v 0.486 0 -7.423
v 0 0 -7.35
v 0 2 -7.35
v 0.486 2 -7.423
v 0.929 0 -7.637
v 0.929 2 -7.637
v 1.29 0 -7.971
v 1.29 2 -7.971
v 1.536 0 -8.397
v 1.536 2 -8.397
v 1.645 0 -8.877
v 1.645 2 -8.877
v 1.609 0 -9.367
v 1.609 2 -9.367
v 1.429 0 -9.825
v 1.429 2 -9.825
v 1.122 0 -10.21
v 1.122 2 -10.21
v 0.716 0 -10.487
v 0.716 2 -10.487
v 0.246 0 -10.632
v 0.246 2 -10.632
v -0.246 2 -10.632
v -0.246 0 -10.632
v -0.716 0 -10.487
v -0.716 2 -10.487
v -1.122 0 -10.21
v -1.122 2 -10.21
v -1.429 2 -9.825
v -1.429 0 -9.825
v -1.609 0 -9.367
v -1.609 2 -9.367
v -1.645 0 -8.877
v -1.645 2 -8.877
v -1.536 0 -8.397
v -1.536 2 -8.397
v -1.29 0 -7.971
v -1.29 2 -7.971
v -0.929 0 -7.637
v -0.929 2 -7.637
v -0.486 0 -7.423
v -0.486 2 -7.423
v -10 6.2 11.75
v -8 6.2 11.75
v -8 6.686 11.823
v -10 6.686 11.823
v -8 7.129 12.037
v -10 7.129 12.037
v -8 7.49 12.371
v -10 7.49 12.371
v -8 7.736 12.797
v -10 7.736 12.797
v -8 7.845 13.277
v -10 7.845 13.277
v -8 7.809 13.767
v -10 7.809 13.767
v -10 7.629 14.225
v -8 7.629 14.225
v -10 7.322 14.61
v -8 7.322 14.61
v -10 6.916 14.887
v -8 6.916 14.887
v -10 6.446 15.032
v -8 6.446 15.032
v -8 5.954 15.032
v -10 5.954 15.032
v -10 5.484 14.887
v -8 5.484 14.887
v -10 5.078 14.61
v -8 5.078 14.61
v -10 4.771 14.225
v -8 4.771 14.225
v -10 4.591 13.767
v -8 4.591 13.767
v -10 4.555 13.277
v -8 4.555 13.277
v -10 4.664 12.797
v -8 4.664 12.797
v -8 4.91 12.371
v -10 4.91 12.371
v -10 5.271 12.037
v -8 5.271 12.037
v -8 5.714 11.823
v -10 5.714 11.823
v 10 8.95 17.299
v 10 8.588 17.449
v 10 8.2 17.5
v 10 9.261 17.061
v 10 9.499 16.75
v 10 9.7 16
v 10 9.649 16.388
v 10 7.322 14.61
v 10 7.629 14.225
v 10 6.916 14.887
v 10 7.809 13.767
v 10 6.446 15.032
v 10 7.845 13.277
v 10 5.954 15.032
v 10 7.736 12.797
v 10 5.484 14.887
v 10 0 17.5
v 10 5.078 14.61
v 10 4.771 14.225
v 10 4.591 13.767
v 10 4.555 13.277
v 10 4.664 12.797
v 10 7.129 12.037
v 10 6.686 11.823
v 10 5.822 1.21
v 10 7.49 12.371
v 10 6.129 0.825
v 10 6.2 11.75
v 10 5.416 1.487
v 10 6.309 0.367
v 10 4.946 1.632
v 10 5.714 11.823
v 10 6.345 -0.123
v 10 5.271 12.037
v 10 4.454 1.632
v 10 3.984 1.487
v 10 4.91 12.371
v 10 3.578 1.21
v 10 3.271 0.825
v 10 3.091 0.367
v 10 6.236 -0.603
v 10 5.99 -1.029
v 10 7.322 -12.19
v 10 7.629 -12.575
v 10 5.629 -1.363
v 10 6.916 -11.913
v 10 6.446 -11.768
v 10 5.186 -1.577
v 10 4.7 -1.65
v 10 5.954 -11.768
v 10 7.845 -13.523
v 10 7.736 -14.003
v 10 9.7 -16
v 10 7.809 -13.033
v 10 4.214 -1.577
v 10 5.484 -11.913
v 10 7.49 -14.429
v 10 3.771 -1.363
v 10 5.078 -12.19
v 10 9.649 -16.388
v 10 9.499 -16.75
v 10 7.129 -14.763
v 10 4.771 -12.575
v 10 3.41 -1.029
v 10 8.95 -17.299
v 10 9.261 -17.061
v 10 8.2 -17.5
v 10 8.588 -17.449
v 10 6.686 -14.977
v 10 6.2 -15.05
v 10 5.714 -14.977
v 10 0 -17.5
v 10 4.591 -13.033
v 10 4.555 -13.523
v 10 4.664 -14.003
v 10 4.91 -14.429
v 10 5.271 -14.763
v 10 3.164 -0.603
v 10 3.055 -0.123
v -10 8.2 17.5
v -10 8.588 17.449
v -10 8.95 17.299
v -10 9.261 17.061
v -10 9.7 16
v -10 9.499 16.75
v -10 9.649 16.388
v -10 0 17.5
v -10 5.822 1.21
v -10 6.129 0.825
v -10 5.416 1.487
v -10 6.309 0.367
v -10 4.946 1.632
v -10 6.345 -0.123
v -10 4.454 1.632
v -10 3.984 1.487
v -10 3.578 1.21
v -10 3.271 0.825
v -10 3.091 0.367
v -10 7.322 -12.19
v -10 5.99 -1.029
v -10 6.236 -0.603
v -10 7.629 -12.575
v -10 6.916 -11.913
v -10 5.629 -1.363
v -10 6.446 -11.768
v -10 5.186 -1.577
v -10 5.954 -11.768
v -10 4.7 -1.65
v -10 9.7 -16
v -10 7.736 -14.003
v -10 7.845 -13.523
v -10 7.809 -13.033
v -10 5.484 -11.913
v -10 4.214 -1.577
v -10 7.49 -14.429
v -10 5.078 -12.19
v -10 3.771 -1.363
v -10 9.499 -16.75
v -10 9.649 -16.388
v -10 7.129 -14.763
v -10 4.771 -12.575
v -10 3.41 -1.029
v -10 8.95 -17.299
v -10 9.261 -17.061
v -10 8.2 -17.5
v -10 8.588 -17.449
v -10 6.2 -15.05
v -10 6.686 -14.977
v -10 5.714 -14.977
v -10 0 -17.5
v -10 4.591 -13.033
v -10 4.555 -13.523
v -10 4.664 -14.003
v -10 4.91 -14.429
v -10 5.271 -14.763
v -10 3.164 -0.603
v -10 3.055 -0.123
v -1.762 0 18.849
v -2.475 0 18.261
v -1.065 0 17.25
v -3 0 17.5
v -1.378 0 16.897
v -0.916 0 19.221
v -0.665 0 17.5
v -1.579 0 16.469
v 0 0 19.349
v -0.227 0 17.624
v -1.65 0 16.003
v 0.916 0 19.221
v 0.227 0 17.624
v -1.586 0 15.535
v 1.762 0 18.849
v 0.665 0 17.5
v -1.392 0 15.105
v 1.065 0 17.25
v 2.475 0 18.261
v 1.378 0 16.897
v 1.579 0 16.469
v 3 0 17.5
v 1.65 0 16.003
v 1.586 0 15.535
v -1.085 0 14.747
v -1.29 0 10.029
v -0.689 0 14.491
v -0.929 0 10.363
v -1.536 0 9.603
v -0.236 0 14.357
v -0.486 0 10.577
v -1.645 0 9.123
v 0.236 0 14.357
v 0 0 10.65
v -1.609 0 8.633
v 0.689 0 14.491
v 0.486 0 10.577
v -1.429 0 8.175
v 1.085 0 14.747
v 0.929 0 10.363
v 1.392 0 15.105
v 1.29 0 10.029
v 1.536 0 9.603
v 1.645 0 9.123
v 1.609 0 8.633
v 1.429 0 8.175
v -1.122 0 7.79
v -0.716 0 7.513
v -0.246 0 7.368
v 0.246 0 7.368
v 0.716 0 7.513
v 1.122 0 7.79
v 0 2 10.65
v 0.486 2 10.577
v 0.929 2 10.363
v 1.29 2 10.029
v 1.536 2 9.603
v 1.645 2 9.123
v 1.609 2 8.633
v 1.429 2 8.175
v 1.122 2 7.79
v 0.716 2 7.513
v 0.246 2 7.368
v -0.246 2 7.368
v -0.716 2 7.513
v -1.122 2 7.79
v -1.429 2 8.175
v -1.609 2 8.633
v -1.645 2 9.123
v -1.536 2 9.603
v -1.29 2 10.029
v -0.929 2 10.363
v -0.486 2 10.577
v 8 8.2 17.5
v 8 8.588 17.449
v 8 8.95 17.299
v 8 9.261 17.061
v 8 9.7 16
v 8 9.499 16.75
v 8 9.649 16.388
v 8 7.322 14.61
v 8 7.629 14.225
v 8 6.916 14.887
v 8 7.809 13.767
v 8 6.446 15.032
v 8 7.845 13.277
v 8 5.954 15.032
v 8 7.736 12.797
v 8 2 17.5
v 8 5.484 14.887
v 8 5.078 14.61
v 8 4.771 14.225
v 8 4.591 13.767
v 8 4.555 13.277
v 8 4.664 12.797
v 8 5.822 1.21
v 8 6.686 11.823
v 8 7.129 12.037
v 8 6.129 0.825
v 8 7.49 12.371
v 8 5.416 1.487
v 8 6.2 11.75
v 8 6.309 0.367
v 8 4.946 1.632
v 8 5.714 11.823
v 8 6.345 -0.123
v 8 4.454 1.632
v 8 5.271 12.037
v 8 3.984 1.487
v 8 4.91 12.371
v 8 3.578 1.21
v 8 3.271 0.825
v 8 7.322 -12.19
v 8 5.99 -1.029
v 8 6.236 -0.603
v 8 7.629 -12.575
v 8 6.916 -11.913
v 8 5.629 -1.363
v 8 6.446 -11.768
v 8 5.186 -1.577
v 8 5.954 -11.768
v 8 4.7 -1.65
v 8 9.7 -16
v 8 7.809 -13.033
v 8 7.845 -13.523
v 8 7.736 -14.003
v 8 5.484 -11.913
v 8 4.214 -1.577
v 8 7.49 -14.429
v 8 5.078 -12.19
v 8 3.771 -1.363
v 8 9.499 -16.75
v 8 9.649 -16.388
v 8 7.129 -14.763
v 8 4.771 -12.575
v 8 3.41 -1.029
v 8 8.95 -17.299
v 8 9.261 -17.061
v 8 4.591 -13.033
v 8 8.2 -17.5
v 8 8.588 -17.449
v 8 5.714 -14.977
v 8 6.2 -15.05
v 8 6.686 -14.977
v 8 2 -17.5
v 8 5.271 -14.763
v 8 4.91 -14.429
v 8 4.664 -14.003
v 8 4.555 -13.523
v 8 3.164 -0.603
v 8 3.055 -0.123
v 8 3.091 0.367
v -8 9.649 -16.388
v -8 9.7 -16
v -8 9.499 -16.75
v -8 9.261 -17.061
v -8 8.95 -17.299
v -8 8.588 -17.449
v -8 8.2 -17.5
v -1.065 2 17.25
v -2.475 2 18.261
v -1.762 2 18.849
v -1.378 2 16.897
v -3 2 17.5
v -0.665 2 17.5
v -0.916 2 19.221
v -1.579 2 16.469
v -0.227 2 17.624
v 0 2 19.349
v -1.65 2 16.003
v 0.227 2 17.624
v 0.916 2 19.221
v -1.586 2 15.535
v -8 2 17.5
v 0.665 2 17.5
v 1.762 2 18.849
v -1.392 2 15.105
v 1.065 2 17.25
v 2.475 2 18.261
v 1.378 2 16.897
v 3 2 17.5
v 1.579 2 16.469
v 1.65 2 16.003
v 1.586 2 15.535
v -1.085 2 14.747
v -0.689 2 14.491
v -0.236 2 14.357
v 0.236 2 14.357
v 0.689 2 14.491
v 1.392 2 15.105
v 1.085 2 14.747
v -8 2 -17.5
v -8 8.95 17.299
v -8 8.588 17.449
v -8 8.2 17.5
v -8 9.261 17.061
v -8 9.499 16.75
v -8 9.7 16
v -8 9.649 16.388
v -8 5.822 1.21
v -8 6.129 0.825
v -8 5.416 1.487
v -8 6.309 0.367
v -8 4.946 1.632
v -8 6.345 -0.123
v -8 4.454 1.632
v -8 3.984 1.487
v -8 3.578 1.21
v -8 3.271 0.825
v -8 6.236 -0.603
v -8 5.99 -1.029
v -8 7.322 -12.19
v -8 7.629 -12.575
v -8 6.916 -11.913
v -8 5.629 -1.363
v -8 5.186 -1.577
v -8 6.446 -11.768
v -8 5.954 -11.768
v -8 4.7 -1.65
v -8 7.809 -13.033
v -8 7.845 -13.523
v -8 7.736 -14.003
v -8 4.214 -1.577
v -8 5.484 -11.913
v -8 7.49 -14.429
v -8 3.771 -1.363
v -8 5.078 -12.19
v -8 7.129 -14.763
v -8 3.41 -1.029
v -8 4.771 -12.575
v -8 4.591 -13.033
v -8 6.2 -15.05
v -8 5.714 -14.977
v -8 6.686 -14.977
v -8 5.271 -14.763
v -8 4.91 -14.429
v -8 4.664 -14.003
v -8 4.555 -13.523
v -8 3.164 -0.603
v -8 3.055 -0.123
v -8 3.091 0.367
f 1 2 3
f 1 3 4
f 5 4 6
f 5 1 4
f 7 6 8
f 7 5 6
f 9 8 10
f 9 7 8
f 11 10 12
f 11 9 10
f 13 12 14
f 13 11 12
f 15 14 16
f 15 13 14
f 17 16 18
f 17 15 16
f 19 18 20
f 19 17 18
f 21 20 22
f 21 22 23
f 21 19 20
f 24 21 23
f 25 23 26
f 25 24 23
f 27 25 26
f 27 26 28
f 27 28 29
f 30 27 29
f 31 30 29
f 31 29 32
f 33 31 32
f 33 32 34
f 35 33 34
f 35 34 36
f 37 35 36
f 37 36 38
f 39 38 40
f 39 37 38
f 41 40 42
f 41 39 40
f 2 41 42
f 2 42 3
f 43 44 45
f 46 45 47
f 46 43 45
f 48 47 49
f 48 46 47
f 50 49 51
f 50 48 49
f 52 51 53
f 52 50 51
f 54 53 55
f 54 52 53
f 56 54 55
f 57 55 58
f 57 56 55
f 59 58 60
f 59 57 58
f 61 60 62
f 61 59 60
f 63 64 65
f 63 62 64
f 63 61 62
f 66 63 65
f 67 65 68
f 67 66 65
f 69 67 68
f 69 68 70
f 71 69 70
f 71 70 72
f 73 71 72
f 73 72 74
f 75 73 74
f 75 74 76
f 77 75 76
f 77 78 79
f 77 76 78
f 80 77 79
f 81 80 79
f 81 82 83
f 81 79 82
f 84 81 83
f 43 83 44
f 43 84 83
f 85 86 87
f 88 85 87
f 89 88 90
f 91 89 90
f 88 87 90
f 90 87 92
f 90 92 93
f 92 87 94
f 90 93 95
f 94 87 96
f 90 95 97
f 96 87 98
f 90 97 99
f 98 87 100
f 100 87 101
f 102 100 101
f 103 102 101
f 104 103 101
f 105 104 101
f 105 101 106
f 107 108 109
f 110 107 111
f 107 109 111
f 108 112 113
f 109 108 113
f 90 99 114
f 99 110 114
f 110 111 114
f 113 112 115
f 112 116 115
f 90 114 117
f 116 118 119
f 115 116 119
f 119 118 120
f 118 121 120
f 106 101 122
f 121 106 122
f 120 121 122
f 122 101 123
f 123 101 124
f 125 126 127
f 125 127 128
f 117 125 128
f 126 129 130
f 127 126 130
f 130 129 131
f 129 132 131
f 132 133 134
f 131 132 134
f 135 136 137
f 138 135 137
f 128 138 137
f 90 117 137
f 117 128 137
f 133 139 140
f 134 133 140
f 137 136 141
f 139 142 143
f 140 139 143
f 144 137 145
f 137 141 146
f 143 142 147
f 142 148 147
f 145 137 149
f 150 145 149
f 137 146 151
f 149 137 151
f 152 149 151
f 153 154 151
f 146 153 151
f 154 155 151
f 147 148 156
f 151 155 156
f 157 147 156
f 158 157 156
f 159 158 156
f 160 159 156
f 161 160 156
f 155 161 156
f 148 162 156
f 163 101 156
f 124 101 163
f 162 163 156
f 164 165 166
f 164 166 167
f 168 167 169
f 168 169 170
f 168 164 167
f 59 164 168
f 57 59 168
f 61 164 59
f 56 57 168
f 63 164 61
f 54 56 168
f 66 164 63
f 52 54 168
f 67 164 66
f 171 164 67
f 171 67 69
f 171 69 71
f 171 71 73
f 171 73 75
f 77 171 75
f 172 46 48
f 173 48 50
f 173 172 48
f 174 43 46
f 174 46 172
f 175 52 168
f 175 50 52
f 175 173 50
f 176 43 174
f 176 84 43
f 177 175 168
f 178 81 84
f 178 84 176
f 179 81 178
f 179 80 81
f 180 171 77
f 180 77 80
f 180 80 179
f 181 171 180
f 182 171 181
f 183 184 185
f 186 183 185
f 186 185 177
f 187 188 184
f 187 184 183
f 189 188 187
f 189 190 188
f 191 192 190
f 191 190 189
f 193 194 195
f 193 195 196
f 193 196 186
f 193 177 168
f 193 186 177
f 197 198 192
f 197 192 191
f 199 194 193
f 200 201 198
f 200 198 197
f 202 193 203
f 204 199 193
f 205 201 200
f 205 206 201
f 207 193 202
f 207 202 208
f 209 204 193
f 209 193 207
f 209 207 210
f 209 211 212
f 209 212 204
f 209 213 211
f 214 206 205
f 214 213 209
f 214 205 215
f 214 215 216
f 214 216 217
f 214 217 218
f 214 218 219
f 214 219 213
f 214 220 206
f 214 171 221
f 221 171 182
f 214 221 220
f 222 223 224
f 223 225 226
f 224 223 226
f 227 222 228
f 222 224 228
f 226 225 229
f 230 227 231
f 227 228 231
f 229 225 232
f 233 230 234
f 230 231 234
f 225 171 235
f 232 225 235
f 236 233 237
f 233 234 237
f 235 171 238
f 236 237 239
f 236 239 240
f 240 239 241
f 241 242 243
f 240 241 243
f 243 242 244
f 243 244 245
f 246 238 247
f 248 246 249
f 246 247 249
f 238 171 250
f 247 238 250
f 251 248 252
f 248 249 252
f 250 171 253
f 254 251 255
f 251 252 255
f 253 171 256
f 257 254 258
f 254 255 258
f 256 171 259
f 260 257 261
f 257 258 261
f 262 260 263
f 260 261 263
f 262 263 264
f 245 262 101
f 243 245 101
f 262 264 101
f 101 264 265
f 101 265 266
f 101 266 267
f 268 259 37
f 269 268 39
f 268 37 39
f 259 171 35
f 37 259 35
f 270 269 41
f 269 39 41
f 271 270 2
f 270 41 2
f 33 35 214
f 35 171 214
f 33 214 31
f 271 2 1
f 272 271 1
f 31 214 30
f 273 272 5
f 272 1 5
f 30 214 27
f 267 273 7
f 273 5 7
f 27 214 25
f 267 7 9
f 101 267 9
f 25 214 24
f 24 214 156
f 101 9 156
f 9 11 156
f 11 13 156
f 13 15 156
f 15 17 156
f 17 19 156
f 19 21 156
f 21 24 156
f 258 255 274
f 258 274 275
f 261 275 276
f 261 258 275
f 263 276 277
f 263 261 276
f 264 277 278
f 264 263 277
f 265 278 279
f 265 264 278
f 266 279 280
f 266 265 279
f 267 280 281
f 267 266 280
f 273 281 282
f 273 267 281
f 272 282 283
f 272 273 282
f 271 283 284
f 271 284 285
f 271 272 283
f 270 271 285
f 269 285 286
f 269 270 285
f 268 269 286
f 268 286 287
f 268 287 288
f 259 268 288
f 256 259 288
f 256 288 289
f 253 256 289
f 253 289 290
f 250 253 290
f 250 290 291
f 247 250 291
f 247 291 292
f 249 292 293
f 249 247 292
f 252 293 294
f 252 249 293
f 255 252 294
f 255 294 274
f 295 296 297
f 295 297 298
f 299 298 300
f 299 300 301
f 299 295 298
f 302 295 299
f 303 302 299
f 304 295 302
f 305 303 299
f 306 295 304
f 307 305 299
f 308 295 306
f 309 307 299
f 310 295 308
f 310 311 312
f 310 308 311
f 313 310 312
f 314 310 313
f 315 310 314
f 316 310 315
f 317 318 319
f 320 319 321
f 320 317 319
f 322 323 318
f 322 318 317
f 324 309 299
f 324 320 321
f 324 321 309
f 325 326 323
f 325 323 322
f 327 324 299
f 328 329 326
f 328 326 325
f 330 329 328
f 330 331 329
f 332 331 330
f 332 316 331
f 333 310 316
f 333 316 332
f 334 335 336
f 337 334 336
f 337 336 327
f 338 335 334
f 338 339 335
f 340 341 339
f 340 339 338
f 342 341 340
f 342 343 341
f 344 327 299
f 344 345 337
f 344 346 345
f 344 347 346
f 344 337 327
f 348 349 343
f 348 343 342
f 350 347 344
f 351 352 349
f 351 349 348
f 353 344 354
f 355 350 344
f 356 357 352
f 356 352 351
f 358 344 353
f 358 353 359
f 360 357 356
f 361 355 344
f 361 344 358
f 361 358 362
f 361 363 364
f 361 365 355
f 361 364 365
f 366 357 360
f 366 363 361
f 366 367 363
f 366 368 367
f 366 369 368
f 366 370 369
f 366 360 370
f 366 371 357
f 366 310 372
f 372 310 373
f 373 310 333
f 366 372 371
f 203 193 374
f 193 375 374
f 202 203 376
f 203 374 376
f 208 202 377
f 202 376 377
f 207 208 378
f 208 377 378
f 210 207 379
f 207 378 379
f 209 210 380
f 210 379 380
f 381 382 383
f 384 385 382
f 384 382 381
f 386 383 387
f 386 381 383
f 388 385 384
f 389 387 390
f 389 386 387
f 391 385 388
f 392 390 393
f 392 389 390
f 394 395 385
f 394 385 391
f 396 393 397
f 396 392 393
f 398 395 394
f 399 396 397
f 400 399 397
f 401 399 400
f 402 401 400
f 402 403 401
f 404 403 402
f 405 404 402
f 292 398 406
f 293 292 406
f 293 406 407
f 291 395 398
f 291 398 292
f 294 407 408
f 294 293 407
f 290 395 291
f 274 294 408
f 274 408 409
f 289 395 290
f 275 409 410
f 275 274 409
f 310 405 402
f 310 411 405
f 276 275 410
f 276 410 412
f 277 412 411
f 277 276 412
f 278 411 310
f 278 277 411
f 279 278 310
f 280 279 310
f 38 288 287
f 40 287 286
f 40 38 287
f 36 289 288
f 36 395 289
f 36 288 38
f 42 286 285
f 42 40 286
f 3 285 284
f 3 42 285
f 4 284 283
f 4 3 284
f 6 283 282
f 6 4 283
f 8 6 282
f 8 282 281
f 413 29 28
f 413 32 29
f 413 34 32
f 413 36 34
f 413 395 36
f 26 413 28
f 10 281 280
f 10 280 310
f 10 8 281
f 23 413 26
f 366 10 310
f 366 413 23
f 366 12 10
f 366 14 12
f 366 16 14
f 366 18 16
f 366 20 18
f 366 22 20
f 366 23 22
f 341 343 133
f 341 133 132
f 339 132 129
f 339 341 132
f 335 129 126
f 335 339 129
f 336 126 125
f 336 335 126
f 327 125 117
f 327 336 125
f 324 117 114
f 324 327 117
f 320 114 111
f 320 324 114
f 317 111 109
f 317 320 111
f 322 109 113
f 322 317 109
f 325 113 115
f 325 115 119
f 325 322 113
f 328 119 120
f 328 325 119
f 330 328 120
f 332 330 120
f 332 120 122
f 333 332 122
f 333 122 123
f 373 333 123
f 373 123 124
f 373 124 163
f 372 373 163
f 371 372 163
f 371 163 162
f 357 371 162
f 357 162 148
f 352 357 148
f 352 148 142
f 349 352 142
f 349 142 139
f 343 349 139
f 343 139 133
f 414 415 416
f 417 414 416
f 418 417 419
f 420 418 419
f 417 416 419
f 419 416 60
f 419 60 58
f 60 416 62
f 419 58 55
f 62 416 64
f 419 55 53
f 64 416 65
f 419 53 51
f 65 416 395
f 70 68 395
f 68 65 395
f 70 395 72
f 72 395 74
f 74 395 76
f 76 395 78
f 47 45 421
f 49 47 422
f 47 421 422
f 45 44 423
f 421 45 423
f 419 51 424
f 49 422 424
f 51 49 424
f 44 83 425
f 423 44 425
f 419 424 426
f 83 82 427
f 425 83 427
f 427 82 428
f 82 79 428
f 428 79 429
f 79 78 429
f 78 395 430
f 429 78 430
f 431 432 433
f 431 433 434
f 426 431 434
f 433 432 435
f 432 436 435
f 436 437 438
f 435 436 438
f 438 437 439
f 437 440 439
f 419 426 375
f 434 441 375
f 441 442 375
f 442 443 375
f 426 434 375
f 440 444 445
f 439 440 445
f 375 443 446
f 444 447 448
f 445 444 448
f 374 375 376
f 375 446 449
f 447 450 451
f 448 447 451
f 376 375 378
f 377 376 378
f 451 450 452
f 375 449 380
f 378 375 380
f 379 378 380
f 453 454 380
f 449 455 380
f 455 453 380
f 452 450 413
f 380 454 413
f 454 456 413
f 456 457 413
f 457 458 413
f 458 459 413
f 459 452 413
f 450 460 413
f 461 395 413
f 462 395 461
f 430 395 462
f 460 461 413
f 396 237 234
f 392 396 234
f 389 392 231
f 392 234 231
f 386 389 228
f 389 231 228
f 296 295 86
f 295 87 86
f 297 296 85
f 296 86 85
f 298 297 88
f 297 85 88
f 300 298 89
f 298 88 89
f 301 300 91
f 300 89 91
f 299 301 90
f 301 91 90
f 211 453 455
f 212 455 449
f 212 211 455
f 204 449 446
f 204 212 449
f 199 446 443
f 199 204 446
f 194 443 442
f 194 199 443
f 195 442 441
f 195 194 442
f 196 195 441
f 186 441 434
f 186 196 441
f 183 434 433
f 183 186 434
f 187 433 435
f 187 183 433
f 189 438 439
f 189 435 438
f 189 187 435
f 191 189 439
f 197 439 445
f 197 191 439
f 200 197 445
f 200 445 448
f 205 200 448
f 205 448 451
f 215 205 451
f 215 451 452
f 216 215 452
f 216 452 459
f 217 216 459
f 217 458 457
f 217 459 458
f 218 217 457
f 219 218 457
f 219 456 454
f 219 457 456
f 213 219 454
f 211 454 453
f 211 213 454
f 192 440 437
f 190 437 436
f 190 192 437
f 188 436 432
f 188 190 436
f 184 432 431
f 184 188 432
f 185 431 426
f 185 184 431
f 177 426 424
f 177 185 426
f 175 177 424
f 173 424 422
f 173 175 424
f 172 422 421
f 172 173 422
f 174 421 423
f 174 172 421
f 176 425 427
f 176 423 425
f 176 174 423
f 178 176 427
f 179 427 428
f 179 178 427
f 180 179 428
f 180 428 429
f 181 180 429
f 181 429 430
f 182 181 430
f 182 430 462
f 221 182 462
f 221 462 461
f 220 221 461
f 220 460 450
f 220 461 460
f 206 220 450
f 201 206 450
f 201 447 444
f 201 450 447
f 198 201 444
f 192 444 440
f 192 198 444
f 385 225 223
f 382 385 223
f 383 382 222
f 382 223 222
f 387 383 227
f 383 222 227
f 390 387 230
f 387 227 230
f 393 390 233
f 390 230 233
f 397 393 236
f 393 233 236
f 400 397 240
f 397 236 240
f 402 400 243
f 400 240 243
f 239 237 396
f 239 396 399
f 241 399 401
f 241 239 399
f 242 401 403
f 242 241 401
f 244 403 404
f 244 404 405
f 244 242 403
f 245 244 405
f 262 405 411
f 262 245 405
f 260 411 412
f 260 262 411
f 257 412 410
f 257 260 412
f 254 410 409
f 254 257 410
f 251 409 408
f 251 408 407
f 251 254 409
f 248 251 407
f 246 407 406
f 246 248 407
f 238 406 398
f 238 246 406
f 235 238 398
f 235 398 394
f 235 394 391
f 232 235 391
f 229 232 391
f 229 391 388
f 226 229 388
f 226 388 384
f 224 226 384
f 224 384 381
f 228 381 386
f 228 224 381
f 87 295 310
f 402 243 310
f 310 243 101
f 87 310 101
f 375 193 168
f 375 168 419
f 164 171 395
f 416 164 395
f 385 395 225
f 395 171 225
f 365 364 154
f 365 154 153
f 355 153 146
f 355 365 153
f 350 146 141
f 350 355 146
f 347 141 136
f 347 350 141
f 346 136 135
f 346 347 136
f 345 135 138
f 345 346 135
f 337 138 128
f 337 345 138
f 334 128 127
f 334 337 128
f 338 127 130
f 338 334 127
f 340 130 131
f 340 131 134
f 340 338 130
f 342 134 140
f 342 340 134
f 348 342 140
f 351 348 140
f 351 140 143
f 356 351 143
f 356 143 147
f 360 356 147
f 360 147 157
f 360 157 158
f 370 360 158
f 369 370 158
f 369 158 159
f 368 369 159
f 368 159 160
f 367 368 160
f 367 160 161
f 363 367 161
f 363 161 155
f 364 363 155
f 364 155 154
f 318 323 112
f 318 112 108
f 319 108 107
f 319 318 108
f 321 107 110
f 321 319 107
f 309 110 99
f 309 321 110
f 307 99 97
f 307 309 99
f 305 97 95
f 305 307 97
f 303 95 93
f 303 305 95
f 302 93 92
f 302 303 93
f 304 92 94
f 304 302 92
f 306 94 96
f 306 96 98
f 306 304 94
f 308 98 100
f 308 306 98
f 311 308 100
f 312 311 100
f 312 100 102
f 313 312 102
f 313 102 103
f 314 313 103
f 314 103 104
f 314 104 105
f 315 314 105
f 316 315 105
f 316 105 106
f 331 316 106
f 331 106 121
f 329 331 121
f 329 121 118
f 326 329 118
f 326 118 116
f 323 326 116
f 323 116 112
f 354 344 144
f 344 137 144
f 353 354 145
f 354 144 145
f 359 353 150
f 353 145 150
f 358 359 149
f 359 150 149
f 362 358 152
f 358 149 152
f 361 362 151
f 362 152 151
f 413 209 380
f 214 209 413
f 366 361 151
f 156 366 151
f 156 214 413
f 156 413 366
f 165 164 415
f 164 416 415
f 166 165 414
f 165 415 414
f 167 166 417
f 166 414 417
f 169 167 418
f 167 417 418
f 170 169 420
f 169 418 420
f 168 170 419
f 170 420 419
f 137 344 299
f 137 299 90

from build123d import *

# Parameters (mm, degrees)
IZIM1_W                     = 16
IZIM1_H                     = 35
IZIM1_R                     = 1.65
Y_KSEKLIK_EKSTR_ZYON1_DEPTH = 2
IZIM3_W                     = 2
IZIM3_H                     = 35
Y_KSEKLIK_EKSTR_ZYON2_DEPTH = 9.7
RADYUS1_R                   = 1.5
KES_EKSTR_ZYON1_DEPTH       = 2
KES_EKSTR_ZYON1_2_DEPTH     = 2
KES_EKSTR_ZYON1_START       = -20
KES_EKSTR_ZYON1_3_OUTLINE_R = 1.65
KES_EKSTR_ZYON1_3_DEPTH     = 20


# Read off the part's stored shape, not the designer's step: Kes-Ekstrüzyon1
with BuildPart() as part:
    # Çizim1 → Yükseklik-Ekstrüzyon1 (new body)
    with BuildSketch(Plane(origin=(0, 0, 0), x_dir=(1, 0, 0), z_dir=(0, 1, 0))):
        Rectangle(IZIM1_W, IZIM1_H)
        with Locations(Location((0, -9, 0), (0, 0, 270))):
            Circle(IZIM1_R, mode=Mode.SUBTRACT)
        with Locations(Location((0, 9, 0), (0, 0, 270))):
            Circle(IZIM1_R, mode=Mode.SUBTRACT)
    extrude(amount=Y_KSEKLIK_EKSTR_ZYON1_DEPTH)

    # Çizim3 → Yükseklik-Ekstrüzyon2 (add)
    with BuildSketch(Plane(origin=(0, 0, 0), x_dir=(1, 0, 0), z_dir=(0, 1, 0))):
        with Locations((9, 0)):
            Rectangle(IZIM3_W, IZIM3_H)
        with Locations((-9, 0)):
            Rectangle(IZIM3_W, IZIM3_H)
    extrude(amount=Y_KSEKLIK_EKSTR_ZYON2_DEPTH)

    # Radyus1
    radyus1_edges = [part.edges().sort_by_distance(p)[0] for p in [
        (9, 9.7, 17.5),
        (9, 9.7, -17.5),
        (-9, 9.7, 17.5),
        (-9, 9.7, -17.5),
    ]]
    fillet(radyus1_edges, radius=RADYUS1_R)

    # Kes-Ekstrüzyon1 outline → Kes-Ekstrüzyon1 (add)
    with BuildSketch(Plane(origin=(0, 0, 0), x_dir=(1, 0, 0), z_dir=(0, 1, 0))):
        with BuildLine():
            ThreePointArc((0.665131566, -17.5), (0, -17.64), (-0.665131566, -17.5))
            Line((-0.665131566, -17.5), (-3, -17.5))
            ThreePointArc((-3, -17.5), (0, -19.348586012), (3, -17.5))
            Line((3, -17.5), (0.665131566, -17.5))
        make_face()
    extrude(amount=KES_EKSTR_ZYON1_DEPTH)

    # Kes-Ekstr_zyon1 2 outline → Kes-Ekstr_zyon1 2 (cut)
    with BuildSketch(Plane(origin=(0, 0, 0), x_dir=(1, 0, 0), z_dir=(0, 1, 0))):
        with BuildLine():
            ThreePointArc((0.665131566, -17.5), (0, -14.34), (-0.665131566, -17.5))
            Line((-0.665131566, -17.5), (0.665131566, -17.5))
        make_face()
    extrude(amount=KES_EKSTR_ZYON1_2_DEPTH, mode=Mode.SUBTRACT)

    # Kes-Ekstr_zyon1 3 outline → Kes-Ekstr_zyon1 3 (cut)
    with BuildSketch(Plane(origin=(10, 0, 0), x_dir=(0, 0, -1), z_dir=(1, 0, 0)).offset(KES_EKSTR_ZYON1_START)):
        with Locations((-13.4, 6.2)):
            Circle(KES_EKSTR_ZYON1_3_OUTLINE_R)
        with Locations((0, 4.7)):
            Circle(KES_EKSTR_ZYON1_3_OUTLINE_R)
        with Locations((13.4, 6.2)):
            Circle(KES_EKSTR_ZYON1_3_OUTLINE_R)
    extrude(amount=KES_EKSTR_ZYON1_3_DEPTH, mode=Mode.SUBTRACT)


solid = part.part
